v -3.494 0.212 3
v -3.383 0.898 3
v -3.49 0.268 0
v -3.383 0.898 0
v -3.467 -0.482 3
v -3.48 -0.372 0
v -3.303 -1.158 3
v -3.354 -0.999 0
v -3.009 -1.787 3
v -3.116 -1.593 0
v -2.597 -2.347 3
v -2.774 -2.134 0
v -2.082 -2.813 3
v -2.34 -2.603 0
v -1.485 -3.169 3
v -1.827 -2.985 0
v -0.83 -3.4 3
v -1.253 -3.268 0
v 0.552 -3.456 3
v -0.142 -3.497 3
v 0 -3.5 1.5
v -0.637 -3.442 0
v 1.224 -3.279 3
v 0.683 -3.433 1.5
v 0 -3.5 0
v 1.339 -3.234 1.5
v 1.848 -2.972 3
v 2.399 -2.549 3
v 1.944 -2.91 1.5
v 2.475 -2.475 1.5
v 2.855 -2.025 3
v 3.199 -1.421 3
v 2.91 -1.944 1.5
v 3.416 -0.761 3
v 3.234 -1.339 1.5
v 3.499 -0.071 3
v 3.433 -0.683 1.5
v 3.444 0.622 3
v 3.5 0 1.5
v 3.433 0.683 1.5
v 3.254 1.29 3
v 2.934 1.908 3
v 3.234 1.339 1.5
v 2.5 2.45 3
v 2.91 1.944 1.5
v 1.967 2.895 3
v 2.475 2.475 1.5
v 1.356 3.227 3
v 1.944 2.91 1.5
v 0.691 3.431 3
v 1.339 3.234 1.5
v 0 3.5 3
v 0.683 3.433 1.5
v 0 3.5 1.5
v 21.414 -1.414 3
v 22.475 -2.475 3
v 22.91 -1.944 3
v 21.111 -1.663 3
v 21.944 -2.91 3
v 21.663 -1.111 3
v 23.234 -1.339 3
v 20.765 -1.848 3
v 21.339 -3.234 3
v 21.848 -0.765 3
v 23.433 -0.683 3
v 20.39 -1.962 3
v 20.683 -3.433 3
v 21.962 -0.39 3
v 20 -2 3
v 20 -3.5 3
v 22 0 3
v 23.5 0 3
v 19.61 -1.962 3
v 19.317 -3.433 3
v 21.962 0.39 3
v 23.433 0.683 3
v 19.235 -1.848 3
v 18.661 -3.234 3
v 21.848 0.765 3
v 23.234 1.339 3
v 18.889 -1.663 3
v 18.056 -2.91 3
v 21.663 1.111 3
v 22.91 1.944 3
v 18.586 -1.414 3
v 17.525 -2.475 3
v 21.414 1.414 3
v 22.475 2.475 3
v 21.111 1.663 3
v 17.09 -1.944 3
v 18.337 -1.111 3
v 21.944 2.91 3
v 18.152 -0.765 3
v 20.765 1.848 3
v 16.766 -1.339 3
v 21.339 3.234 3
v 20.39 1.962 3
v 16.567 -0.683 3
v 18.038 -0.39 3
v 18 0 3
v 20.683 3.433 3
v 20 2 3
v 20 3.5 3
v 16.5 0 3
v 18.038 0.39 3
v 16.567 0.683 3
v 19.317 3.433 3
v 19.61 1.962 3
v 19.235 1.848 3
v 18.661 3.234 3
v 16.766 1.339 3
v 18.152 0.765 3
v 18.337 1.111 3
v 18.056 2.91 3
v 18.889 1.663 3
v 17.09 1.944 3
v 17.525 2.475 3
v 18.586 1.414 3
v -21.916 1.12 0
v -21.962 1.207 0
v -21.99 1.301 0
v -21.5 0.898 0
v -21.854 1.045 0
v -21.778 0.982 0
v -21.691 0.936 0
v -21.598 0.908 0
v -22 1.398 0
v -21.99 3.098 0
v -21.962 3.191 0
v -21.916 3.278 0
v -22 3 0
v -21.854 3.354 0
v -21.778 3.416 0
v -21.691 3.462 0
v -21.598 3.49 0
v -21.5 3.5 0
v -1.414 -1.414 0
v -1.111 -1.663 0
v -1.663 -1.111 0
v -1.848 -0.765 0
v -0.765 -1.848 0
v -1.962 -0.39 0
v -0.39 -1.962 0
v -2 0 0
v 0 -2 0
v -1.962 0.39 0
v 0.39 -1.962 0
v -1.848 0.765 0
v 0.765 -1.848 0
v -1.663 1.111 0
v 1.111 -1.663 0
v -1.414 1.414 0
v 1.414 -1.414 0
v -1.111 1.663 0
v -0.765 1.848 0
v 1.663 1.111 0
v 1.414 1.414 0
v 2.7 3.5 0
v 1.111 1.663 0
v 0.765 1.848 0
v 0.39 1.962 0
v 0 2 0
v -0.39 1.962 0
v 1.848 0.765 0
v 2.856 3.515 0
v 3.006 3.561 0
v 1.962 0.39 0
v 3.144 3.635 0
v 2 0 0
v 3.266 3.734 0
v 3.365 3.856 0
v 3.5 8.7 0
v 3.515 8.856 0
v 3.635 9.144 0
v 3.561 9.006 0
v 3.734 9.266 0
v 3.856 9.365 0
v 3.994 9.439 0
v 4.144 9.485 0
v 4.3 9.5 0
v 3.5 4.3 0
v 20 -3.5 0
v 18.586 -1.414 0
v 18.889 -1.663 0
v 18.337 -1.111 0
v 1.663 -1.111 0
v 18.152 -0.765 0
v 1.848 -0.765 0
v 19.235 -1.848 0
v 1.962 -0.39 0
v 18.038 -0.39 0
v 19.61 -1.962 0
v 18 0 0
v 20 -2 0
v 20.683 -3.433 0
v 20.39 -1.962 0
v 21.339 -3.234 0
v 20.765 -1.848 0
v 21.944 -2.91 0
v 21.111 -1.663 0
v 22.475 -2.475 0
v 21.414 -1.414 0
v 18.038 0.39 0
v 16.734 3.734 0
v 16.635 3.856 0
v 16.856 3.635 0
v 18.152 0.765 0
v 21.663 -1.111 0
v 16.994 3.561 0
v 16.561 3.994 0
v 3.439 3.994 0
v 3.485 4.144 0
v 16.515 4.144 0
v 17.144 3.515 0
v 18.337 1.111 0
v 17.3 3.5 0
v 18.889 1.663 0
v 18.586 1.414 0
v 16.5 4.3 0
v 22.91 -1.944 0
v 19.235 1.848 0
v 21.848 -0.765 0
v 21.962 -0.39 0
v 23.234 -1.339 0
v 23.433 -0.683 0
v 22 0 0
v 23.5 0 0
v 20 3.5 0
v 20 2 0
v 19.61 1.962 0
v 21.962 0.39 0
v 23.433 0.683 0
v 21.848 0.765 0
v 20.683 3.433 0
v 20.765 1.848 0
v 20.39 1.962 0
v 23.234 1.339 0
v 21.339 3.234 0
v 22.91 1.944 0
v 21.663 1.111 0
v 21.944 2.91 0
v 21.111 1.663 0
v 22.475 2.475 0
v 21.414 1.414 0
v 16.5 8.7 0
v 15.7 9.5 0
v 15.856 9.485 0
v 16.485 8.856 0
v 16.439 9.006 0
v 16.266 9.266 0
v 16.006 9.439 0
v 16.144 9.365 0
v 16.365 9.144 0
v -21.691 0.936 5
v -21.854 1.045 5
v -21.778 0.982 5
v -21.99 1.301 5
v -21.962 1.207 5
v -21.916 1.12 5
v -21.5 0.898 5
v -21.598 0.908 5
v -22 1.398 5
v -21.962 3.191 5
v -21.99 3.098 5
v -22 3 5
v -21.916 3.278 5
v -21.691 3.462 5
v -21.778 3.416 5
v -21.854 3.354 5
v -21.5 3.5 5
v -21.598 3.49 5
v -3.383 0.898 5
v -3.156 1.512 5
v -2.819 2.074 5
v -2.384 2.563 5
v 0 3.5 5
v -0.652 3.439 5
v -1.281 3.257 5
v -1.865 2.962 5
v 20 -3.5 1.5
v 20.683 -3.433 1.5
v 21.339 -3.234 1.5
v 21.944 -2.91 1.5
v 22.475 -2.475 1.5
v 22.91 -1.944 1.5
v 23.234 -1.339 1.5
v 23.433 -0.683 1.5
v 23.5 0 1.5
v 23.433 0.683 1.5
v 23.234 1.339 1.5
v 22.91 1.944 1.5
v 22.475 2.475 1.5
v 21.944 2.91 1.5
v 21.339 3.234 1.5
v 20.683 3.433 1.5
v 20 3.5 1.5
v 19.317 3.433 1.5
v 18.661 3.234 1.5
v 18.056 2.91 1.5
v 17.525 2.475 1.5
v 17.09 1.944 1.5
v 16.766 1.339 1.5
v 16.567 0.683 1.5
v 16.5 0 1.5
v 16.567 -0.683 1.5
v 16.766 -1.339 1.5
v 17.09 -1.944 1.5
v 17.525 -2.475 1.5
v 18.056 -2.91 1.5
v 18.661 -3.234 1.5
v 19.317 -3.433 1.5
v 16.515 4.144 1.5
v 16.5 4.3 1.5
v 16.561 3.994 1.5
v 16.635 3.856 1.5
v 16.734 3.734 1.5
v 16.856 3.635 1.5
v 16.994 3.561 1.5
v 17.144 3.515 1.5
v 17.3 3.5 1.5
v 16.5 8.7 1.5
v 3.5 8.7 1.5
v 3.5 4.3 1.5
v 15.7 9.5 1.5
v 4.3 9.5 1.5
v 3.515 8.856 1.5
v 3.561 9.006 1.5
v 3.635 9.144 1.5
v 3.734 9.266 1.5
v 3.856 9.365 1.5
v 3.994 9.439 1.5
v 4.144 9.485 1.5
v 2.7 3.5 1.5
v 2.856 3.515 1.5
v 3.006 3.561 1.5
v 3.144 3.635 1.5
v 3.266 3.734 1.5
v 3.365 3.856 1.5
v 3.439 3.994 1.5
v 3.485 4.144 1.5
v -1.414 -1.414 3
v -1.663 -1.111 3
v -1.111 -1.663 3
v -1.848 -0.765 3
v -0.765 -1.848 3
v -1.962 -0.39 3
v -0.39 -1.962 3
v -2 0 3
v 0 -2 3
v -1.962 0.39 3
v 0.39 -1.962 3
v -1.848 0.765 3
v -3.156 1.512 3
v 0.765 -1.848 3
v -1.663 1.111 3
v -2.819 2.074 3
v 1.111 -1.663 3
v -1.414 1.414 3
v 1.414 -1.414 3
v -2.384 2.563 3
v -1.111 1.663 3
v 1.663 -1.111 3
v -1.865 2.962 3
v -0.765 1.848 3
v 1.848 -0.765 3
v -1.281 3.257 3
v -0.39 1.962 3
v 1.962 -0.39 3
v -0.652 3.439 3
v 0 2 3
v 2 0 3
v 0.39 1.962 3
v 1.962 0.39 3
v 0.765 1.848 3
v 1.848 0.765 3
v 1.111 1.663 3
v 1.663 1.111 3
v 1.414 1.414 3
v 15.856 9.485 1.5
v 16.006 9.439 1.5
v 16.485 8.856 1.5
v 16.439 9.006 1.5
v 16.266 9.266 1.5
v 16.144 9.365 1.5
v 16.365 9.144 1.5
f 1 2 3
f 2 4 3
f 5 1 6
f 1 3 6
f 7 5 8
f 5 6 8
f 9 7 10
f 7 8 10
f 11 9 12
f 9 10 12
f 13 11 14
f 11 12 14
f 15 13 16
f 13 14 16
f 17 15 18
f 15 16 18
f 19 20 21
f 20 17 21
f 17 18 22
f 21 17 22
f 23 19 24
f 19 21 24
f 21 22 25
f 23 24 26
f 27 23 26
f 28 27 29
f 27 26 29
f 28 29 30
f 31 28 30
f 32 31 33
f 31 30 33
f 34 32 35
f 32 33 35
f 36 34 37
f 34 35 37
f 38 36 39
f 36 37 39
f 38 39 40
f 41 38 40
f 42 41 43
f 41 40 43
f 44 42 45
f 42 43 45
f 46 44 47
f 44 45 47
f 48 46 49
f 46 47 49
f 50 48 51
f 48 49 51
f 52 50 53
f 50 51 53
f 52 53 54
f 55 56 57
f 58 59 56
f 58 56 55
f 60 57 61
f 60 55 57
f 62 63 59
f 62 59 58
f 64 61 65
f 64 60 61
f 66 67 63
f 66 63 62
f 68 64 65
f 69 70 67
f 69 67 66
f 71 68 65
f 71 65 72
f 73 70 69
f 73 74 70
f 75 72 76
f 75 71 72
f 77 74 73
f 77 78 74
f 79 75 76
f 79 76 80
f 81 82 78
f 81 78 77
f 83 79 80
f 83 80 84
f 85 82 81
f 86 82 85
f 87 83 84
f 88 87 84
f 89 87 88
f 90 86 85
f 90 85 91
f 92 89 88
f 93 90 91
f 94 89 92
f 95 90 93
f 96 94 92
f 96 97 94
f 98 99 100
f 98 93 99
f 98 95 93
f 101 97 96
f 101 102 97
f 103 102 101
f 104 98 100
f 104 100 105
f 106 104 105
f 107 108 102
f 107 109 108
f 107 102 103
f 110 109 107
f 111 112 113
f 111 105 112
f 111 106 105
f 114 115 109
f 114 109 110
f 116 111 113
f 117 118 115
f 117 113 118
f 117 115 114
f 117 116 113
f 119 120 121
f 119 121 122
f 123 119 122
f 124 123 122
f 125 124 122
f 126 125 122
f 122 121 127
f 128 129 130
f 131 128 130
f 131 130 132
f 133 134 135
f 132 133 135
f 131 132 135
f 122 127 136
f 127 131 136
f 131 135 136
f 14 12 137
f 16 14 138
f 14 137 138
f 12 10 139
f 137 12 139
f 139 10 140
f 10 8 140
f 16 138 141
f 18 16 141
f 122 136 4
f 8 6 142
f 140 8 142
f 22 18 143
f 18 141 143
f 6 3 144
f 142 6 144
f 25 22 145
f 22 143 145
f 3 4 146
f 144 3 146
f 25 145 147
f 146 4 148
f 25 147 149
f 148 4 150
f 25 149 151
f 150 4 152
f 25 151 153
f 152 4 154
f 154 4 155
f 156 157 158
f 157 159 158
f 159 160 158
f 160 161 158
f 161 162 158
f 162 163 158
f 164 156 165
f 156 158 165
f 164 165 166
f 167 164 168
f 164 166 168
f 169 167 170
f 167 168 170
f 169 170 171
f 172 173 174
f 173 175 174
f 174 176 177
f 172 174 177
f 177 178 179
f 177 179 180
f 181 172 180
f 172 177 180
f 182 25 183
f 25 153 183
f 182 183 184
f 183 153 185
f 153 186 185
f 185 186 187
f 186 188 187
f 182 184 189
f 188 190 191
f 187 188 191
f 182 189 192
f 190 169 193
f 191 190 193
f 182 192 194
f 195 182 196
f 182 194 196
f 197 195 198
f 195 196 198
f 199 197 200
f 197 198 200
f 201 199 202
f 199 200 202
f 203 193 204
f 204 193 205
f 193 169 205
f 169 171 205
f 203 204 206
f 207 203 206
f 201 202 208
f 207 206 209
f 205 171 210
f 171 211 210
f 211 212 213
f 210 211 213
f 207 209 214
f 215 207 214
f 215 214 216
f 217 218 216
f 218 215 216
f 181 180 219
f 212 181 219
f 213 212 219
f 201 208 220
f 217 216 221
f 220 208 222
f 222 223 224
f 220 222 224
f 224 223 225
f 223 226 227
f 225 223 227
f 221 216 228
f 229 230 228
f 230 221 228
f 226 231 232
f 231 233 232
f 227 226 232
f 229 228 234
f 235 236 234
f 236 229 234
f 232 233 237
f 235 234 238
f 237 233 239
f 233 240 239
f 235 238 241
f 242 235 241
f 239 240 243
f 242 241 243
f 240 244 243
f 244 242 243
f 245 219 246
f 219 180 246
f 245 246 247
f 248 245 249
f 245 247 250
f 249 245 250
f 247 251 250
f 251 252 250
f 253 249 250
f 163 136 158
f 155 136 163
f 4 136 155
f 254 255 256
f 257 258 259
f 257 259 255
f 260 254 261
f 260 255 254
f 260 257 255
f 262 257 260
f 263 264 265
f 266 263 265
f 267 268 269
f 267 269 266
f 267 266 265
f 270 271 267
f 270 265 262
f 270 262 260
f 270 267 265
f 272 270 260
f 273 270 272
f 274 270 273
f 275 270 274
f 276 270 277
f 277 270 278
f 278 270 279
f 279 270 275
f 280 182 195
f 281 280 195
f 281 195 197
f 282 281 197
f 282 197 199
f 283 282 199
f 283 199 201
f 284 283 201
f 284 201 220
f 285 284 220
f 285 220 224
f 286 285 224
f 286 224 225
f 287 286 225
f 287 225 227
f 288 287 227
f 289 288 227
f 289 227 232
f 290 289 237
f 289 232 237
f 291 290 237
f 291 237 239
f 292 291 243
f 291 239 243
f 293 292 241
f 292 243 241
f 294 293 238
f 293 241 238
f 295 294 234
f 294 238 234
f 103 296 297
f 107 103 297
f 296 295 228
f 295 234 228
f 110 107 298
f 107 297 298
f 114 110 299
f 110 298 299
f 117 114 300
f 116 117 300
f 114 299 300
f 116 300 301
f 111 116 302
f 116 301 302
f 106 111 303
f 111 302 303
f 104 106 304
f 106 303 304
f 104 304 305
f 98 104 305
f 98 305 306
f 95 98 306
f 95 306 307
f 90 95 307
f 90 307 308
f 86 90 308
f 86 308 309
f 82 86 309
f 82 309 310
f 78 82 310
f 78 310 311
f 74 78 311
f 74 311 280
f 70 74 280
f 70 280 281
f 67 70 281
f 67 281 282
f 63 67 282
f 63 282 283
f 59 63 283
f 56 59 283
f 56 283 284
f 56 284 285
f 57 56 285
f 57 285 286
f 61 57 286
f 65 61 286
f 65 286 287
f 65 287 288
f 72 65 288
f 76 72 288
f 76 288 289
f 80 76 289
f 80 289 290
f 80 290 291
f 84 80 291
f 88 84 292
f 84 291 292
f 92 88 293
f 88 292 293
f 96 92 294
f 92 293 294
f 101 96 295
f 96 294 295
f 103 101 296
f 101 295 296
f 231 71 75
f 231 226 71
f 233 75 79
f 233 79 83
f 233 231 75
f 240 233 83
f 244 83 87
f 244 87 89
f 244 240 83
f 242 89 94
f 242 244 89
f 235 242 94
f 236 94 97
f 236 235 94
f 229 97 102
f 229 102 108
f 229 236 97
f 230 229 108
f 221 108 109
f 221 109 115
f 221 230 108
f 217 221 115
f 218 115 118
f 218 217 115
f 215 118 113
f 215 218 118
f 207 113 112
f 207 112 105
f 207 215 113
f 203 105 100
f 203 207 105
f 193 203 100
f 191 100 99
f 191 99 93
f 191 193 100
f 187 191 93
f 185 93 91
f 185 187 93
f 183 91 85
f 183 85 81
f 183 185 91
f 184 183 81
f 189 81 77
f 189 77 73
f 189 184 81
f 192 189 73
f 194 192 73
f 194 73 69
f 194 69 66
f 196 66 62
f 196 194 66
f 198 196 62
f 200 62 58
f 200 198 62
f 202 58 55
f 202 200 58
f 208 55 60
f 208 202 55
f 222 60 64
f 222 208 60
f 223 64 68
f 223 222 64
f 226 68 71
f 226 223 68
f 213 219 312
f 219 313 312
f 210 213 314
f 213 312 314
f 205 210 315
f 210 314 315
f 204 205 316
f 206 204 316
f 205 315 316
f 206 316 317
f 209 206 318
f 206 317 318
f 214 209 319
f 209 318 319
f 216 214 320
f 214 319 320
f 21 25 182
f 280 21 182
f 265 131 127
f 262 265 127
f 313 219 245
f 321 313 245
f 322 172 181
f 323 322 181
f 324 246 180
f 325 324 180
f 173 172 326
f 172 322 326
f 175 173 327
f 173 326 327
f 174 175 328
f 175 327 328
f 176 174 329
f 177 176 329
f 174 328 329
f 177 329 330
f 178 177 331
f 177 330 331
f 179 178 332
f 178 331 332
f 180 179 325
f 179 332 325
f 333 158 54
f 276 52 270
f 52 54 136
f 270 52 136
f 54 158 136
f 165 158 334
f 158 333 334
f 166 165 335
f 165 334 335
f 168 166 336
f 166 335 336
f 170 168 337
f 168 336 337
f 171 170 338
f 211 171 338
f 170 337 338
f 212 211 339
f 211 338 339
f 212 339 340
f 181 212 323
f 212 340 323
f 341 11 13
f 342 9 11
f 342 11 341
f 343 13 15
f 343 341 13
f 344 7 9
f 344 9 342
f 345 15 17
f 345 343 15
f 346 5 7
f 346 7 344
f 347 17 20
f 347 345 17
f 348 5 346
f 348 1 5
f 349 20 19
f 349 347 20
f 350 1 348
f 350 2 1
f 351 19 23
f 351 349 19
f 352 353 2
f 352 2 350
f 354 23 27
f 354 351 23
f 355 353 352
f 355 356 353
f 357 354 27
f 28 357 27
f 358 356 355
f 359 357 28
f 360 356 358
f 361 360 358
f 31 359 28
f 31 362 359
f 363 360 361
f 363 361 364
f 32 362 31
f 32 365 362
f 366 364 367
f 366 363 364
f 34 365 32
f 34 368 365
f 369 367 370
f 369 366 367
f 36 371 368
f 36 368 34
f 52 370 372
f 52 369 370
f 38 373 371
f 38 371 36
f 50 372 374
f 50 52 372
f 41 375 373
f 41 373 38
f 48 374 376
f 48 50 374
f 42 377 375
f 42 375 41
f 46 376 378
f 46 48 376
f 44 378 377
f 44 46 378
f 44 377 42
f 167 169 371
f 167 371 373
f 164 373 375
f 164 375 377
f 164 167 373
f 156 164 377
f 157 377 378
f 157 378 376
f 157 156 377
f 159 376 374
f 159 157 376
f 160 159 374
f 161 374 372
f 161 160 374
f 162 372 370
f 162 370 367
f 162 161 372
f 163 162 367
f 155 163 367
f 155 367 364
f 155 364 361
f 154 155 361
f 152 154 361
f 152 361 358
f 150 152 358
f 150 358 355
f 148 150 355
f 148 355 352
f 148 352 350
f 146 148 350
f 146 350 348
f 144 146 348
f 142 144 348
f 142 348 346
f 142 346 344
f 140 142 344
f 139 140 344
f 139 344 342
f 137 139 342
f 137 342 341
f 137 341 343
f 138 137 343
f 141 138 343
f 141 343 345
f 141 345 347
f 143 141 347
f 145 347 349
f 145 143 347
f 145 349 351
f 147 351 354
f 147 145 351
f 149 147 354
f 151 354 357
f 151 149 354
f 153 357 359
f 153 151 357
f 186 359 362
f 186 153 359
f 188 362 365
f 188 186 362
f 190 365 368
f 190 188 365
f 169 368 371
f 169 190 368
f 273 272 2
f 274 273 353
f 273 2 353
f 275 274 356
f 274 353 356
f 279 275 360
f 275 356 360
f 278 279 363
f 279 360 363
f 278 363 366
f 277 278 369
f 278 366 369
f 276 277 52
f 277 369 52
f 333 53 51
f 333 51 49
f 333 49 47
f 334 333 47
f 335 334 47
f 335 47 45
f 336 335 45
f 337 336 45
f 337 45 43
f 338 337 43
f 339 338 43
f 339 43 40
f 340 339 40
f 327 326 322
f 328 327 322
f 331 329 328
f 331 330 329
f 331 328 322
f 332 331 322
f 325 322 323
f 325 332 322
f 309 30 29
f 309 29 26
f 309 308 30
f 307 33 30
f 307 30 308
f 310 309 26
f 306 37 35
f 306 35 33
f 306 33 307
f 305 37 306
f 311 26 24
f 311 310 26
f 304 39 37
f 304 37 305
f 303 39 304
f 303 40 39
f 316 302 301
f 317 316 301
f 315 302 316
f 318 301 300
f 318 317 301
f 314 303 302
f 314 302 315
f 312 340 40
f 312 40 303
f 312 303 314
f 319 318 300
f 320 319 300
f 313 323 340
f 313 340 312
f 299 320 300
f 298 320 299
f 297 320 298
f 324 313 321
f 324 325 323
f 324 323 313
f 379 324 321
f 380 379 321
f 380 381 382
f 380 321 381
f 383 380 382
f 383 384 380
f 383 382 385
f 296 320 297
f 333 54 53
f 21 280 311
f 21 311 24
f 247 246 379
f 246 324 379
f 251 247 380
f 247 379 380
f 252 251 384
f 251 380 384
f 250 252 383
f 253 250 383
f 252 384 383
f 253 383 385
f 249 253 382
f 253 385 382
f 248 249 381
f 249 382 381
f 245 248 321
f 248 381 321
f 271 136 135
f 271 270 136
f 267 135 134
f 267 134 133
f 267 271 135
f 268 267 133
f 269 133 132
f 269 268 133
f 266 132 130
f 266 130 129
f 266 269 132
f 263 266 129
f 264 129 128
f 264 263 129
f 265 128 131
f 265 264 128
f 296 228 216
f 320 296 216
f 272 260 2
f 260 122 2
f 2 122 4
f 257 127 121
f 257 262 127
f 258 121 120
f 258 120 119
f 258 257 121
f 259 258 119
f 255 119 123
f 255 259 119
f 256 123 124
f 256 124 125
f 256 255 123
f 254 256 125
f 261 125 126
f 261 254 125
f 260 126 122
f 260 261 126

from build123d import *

# Parameters (mm, degrees)
SKETCH1_R           = 2
BOSS_EXTRUDE1_DEPTH = 1.5
BOSS_EXTRUDE2_DEPTH = 5
SKETCH2_R           = 3.5
SKETCH2_R_2         = 2
BOSS_EXTRUDE3_DEPTH = 1.5
FILLET2_R           = 0.8
FILLET3_R           = 0.5


with BuildPart() as part:
    # Sketch1 → Boss-Extrude1 (new body)
    with BuildSketch(Plane.XY):
        with BuildLine():
            Line((3.5, 3.5), (0, 3.5))
            ThreePointArc((0, 3.5), (-3.5, 0), (0, -3.5))
            Line((0, -3.5), (20, -3.5))
            ThreePointArc((20, -3.5), (23.5, 0), (20, 3.5))
            Line((20, 3.5), (16.5, 3.5))
            Line((16.5, 3.5), (16.5, 9.5))
            Line((16.5, 9.5), (3.5, 9.5))
            Line((3.5, 9.5), (3.5, 3.5))
        make_face()
        Circle(SKETCH1_R, mode=Mode.SUBTRACT)
        with Locations((20, 0)):
            Circle(SKETCH1_R, mode=Mode.SUBTRACT)
    extrude(amount=BOSS_EXTRUDE1_DEPTH)

    # Sketch1<3> → Boss-Extrude2 (add)
    with BuildSketch(Plane.XY):
        with BuildLine():
            ThreePointArc((-3.382776961, 0.898231613), (-2.133798181, 2.774329707), (0, 3.5))
            Line((0, 3.5), (-22, 3.5))
            Line((-22, 3.5), (-22, 0.898231613))
            Line((-22, 0.898231613), (-3.382776961, 0.898231613))
        make_face()
    extrude(amount=BOSS_EXTRUDE2_DEPTH)

    # Sketch2 → Boss-Extrude3 (add)
    # profile 1 of 2: a face of its own
    with BuildSketch(Plane.XY.offset(1.5)):
        with Locations((20, 0)):
            Circle(SKETCH2_R)
        with Locations((20, 0)):
            Circle(SKETCH2_R_2, mode=Mode.SUBTRACT)
    # profile 2 of 2: a face of its own
    with BuildSketch(Plane.XY.offset(1.5)):
        Circle(SKETCH2_R)
        Circle(SKETCH2_R_2, mode=Mode.SUBTRACT)
    extrude(amount=BOSS_EXTRUDE3_DEPTH)

    # Fillet2
    fillet2_edges = [part.edges().sort_by_distance(p)[0] for p in [
        (16.5, 9.5, 0.75),
        (16.5, 3.5, 0.75),
        (3.5, 9.5, 0.75),
        (3.5, 3.5, 0.75),
    ]]
    fillet(fillet2_edges, radius=FILLET2_R)

    # Fillet3
    fillet3_edges = [part.edges().sort_by_distance(p)[0] for p in [
        (-22, 3.5, 2.5),
        (-22, 0.898231613, 2.5),
    ]]
    fillet(fillet3_edges, radius=FILLET3_R)


solid = part.part
